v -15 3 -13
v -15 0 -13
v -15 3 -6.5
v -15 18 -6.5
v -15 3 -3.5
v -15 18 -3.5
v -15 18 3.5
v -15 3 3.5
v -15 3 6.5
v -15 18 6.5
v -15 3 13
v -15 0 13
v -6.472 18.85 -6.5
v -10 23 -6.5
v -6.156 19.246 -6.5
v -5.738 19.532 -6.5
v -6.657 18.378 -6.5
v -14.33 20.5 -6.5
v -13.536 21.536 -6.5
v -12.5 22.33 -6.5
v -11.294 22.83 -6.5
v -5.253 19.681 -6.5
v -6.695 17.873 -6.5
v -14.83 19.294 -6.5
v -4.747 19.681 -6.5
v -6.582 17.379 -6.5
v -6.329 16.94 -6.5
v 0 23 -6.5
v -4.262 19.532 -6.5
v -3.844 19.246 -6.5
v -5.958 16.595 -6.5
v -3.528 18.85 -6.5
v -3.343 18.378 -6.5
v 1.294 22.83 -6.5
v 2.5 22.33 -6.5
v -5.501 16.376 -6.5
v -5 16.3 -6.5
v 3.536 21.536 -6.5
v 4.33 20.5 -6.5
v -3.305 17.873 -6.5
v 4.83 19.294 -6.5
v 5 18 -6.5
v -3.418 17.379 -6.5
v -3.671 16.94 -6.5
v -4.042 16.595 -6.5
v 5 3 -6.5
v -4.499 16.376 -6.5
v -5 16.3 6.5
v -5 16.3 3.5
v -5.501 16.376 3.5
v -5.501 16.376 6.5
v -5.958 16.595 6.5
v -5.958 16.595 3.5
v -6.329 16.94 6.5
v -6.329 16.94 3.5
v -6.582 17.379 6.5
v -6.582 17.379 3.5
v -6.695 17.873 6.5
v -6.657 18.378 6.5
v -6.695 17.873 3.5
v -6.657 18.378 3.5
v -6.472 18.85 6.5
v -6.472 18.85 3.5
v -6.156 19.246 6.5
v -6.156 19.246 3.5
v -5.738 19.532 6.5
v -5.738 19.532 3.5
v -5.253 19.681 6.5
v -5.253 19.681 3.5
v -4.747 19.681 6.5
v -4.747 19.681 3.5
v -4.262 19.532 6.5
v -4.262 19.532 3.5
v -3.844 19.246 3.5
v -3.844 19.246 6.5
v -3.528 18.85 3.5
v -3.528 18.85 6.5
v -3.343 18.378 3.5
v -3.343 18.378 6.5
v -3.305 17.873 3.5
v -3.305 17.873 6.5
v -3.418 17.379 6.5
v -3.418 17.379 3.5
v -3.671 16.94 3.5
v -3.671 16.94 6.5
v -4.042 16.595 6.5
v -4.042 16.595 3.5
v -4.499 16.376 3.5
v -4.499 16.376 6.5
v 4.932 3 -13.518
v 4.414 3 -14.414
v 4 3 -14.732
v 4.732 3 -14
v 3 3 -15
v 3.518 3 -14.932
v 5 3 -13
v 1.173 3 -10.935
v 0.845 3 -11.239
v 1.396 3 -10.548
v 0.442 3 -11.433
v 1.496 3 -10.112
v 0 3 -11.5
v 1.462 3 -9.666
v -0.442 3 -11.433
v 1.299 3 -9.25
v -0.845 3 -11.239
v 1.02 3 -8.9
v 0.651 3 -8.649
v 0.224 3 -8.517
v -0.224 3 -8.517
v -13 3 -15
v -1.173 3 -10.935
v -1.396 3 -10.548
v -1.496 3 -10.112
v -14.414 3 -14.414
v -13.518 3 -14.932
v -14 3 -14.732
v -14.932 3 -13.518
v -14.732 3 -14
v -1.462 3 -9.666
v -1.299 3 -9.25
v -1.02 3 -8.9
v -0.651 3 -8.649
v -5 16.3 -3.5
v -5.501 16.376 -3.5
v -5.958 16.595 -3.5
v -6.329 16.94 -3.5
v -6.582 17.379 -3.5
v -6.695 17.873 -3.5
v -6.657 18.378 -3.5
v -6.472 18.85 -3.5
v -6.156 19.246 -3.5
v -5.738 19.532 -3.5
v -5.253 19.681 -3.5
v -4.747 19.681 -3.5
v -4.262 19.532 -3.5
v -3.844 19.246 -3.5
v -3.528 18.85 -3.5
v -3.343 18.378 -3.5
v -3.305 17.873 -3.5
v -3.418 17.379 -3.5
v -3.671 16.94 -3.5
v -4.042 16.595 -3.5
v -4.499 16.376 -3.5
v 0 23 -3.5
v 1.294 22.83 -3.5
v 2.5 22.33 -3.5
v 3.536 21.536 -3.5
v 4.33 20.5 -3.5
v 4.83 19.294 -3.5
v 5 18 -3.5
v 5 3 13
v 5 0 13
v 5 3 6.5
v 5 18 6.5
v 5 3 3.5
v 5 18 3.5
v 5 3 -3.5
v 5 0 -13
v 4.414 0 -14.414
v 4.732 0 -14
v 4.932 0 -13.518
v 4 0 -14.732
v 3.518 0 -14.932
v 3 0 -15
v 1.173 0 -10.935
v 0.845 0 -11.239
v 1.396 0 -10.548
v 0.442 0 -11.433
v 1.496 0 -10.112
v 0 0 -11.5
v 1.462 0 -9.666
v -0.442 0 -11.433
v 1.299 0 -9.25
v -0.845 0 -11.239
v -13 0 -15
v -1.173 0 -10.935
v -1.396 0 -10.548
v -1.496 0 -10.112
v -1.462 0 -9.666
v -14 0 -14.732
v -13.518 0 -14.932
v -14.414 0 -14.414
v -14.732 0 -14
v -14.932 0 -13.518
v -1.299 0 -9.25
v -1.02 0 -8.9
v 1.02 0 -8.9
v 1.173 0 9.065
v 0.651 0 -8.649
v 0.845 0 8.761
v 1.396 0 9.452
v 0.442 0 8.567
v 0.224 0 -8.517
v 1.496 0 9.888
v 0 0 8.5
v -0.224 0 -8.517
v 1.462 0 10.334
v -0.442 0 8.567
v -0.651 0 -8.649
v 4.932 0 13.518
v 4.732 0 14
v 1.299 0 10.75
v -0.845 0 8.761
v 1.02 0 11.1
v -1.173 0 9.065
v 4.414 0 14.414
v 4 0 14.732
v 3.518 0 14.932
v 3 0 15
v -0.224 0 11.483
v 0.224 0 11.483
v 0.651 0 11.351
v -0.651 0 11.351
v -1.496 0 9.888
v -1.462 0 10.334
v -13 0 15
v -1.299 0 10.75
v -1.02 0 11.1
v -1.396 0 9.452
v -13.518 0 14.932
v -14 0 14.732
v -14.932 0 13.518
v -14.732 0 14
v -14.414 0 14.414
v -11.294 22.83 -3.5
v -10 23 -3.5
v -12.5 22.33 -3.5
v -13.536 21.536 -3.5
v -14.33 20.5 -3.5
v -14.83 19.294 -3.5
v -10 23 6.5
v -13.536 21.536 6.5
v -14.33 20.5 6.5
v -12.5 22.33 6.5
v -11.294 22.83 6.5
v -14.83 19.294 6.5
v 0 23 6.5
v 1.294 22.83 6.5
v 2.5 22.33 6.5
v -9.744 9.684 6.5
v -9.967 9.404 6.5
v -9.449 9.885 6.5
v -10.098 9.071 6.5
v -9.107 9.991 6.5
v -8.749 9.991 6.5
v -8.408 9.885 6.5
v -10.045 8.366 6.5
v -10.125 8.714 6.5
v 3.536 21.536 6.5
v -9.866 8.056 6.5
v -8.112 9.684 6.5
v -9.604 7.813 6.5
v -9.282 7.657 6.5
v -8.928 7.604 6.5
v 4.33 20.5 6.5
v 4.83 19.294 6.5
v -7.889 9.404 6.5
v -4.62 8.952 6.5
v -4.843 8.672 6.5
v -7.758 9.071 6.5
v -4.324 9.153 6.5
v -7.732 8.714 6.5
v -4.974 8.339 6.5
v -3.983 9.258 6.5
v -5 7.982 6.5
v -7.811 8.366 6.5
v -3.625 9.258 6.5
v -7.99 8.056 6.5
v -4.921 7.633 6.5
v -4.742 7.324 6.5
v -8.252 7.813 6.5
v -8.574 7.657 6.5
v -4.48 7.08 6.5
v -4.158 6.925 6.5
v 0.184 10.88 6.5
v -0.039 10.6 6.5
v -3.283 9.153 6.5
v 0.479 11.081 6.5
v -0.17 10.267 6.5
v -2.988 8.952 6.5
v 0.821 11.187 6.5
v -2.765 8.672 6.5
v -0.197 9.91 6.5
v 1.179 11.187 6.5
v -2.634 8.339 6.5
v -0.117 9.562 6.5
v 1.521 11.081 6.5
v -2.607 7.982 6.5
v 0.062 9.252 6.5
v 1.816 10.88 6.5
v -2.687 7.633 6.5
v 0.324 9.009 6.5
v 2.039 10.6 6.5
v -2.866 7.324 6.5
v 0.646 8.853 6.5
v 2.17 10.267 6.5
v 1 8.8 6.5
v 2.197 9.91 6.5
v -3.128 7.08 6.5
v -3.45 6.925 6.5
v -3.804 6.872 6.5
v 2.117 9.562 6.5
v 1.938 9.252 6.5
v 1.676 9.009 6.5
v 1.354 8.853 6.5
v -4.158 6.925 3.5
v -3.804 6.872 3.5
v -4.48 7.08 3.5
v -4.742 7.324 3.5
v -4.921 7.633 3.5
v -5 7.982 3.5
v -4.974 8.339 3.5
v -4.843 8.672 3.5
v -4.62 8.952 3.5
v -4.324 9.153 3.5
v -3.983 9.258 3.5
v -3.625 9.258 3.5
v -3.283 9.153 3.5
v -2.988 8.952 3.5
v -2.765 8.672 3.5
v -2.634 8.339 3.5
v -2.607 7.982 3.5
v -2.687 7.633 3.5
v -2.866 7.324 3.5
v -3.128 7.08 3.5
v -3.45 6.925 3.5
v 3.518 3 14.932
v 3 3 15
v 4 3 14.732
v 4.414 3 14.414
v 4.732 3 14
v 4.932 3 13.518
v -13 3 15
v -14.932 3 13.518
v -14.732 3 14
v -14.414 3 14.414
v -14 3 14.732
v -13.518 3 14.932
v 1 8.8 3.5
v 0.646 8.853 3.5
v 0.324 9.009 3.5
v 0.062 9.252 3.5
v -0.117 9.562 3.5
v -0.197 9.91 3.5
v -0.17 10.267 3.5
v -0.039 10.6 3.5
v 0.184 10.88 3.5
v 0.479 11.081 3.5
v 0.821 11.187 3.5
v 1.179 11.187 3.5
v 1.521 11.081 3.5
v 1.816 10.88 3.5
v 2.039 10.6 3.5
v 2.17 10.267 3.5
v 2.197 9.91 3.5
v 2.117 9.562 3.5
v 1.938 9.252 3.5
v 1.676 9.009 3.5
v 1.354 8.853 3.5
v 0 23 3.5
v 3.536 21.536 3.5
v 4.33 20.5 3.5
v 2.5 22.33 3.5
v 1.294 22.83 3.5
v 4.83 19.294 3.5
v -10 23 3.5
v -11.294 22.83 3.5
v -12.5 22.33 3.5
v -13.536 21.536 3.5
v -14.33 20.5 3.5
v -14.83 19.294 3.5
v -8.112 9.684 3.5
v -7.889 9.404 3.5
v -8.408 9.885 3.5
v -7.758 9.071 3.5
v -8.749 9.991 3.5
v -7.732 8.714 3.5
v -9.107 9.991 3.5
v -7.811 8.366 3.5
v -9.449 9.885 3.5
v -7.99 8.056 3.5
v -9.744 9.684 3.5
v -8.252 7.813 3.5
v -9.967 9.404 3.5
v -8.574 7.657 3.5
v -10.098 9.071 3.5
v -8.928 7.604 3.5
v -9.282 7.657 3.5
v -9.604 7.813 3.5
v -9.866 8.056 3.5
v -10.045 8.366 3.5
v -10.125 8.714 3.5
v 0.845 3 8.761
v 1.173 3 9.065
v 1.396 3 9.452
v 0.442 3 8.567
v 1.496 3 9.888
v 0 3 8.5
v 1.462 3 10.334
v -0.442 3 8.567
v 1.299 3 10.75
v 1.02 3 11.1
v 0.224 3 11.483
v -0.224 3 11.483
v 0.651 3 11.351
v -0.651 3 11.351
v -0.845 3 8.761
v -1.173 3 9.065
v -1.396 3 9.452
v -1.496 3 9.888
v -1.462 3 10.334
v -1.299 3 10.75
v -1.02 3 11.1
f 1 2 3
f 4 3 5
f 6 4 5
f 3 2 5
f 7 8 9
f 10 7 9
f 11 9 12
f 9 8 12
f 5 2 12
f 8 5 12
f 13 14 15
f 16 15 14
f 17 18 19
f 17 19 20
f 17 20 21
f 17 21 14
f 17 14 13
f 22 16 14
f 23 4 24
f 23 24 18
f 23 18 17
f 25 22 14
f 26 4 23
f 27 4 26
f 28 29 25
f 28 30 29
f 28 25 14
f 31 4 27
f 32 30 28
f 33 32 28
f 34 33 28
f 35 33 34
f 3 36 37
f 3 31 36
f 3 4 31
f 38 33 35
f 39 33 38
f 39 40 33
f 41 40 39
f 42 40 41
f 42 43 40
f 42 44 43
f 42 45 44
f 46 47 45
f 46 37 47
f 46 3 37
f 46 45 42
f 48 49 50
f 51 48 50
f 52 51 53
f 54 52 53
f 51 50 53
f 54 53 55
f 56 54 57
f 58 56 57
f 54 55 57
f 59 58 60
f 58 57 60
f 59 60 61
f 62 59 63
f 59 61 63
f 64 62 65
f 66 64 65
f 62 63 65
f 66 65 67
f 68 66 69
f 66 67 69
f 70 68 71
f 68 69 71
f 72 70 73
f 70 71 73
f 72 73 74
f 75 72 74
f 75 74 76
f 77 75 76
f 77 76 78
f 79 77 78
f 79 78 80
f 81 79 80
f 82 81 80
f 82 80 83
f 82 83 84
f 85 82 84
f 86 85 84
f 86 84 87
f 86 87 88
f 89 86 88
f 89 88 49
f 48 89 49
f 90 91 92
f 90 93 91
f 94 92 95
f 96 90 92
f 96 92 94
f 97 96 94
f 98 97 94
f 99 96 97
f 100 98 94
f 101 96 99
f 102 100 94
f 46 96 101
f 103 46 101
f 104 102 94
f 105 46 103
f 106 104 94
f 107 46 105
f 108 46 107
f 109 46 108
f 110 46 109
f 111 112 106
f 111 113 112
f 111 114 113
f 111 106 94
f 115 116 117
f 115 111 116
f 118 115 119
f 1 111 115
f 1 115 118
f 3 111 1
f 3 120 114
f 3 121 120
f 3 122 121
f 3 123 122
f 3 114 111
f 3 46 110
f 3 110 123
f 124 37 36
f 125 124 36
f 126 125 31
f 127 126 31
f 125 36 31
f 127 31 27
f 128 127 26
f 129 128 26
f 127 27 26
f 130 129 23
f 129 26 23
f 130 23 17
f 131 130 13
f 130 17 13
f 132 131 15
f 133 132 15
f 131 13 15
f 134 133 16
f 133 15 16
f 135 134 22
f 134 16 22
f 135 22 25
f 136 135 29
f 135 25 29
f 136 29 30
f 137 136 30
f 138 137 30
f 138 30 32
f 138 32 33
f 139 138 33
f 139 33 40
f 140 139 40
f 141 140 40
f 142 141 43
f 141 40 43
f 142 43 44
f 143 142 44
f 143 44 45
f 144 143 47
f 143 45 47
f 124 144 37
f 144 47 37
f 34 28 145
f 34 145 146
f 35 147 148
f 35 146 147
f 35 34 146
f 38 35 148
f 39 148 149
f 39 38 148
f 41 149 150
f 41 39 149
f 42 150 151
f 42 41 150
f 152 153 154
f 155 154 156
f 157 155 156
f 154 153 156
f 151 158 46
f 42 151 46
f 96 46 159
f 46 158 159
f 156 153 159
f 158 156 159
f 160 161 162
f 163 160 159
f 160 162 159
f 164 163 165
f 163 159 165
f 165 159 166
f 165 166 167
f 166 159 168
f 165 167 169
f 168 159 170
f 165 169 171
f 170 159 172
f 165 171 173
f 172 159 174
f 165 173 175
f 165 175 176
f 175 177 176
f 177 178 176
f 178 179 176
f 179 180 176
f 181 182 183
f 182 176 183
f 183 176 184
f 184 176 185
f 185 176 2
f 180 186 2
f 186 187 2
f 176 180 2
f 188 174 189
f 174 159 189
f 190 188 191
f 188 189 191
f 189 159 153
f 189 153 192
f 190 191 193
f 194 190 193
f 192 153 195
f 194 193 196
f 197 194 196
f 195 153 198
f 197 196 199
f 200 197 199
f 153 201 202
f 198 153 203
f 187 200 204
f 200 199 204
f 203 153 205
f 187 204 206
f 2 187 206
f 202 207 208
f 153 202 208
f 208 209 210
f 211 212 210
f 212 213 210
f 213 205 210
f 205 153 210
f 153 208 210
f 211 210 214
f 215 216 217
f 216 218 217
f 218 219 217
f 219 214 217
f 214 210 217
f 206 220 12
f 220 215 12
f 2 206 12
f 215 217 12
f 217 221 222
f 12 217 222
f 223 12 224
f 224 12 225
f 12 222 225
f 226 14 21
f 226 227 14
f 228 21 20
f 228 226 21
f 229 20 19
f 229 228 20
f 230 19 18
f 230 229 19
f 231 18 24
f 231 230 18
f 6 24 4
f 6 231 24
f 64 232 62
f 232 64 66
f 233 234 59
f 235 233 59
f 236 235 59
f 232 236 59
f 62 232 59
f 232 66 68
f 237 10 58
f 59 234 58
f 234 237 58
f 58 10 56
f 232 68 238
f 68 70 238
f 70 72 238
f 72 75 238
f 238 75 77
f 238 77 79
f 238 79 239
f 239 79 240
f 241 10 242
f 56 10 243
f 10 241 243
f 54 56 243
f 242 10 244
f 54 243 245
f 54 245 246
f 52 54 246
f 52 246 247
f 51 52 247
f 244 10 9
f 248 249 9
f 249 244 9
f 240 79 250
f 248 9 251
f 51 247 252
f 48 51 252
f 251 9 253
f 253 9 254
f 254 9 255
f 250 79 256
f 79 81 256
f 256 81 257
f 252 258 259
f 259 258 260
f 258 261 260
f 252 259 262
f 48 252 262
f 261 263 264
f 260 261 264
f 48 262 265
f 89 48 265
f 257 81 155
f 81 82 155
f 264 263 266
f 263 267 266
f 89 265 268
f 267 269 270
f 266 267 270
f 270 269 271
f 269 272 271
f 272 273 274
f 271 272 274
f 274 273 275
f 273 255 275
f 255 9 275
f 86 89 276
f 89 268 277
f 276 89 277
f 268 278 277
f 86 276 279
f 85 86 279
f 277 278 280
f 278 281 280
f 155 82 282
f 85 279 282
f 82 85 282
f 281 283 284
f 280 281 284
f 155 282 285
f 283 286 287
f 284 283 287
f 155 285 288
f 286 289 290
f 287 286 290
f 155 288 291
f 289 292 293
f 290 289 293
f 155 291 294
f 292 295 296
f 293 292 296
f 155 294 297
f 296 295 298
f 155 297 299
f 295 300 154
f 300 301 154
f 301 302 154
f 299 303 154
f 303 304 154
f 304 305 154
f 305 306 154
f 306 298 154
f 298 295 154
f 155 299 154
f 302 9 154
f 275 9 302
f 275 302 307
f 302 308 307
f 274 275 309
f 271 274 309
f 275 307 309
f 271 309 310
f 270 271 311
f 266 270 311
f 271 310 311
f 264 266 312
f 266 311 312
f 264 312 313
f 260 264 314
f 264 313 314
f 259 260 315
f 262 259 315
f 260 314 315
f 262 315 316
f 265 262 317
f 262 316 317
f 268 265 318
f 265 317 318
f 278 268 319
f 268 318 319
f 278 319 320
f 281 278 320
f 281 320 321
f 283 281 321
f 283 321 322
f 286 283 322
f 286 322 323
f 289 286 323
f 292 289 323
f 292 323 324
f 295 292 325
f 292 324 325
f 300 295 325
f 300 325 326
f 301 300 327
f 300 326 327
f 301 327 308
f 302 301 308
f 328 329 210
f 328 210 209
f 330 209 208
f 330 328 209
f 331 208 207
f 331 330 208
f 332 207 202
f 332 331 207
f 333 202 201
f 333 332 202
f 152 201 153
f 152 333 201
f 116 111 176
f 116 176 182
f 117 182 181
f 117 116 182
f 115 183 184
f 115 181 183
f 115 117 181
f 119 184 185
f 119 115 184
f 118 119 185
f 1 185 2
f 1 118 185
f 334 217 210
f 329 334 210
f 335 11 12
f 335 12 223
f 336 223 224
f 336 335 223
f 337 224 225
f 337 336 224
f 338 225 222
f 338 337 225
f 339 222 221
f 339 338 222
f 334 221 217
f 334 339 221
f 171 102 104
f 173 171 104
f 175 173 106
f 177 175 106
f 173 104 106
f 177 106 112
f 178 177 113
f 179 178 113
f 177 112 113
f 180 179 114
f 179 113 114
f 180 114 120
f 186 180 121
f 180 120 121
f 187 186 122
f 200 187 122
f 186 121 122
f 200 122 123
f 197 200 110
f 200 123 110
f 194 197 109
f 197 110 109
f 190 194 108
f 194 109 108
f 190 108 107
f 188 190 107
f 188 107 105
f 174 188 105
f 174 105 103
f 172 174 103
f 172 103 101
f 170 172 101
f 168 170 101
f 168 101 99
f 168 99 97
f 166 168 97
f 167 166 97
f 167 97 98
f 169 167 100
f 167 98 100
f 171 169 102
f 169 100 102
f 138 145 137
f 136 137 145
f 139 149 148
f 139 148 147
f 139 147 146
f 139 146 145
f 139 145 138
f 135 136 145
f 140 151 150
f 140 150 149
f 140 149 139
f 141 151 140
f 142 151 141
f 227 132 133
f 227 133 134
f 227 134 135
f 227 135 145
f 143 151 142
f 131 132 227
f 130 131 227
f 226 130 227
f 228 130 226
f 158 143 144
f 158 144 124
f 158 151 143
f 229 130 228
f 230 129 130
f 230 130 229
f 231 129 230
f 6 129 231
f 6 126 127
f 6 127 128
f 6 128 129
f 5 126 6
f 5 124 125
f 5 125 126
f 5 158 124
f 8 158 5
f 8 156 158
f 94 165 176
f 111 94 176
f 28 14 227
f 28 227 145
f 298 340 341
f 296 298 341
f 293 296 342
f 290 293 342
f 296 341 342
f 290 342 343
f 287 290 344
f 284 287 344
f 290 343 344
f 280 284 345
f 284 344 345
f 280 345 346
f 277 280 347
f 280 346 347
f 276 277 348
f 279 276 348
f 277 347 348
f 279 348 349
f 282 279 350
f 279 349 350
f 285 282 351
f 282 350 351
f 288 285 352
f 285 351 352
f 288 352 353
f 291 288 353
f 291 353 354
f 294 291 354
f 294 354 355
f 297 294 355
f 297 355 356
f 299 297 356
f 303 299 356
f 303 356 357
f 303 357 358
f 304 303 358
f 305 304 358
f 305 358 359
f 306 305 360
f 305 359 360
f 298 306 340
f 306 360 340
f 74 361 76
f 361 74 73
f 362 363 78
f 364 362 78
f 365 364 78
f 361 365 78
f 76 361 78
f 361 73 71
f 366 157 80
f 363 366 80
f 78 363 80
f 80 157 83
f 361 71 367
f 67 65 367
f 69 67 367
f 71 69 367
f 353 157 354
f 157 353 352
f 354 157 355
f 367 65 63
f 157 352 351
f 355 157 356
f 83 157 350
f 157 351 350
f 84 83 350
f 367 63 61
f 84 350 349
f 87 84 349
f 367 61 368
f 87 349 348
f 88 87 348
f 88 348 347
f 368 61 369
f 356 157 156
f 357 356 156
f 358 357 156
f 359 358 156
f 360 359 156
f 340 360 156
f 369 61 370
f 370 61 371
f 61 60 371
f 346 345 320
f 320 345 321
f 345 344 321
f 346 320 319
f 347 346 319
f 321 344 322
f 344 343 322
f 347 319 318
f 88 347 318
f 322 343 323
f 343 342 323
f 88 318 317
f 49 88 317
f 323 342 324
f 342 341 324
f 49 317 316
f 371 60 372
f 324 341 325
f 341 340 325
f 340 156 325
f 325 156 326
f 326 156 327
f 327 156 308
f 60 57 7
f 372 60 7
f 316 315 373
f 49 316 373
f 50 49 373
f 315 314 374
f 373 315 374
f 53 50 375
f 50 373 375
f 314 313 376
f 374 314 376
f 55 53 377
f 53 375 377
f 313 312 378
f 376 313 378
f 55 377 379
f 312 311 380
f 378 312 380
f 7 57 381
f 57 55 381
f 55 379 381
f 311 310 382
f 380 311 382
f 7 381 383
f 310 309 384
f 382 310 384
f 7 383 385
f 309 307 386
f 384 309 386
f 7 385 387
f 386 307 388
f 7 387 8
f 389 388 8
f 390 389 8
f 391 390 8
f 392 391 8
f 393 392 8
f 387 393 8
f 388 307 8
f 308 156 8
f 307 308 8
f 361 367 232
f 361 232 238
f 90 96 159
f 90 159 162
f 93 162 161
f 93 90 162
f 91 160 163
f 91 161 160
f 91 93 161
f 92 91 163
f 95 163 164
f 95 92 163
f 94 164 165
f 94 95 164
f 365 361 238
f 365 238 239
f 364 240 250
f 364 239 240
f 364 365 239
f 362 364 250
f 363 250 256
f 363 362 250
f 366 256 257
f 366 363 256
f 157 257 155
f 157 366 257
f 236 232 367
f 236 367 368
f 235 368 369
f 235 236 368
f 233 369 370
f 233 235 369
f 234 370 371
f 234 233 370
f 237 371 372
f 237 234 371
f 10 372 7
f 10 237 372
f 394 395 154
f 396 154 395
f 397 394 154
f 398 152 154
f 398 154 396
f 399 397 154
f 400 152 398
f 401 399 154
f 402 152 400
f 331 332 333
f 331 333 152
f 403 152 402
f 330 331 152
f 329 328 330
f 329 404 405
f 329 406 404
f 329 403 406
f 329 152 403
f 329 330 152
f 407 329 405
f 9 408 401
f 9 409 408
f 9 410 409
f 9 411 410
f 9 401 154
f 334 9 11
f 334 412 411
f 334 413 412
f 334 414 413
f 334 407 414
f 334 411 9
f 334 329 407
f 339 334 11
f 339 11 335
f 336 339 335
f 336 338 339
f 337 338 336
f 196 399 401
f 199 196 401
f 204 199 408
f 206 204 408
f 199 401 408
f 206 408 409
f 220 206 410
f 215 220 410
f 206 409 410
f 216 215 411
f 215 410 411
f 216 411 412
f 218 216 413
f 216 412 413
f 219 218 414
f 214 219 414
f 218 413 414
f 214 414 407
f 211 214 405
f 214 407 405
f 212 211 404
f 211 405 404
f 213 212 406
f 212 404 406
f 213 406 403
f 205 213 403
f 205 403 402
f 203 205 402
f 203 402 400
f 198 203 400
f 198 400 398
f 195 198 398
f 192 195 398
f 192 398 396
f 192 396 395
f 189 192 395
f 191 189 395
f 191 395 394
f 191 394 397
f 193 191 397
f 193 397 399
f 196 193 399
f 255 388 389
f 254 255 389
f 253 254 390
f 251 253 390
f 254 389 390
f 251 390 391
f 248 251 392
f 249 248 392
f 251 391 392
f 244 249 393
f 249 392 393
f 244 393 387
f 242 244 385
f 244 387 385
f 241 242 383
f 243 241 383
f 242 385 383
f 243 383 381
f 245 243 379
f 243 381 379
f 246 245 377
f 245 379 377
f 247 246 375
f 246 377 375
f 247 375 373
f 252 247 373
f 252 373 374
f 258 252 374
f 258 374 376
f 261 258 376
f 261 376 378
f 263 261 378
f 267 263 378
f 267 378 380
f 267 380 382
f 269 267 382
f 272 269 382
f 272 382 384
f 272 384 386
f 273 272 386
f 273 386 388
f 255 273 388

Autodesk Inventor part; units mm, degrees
ref_plane "YZ Plane" through (0, 0, 0) normal (1, 0, 0) x (0, 1, 0)
ref_plane "XZ Plane" through (0, 0, 0) normal (0, 1, 0) x (-1, 0, 0)
ref_plane "XY Plane" through (0, 0, 0) normal (0, 0, 1) x (1, 0, 0)
sketch "Szkic1" plane through (0, 0, 0) normal (0, 1, 0) x (-1, 0, 0)
  line L0 (15, 15) -> (-5, 15)
  line L1 (-5, 15) -> (-5, -15)
  line L2 (-5, -15) -> (15, -15)
  line L3 (15, -15) -> (15, 15)
  point P0 (0, 0)
  point P1 (0, 10)
  point P2 (0, -10)
  dimension "d0" = 20
  dimension "d1" = 20
  dimension "d2" = 15
  dimension "d3" = 5
  dimension "d4" = 5
extrude "Wyciągnięcie proste1" add sketch "Szkic1" along normal blind 3
hole "Otwór1" at (0, 0, 10) at (0, 0, -10) direction (0, 1, 0) diameter 3 end through all
sketch "Szkic2" plane through (0, 3, 0) normal (0, 1, 0) x (1, 0, 0)
  circle A0 centre (0, -10) radius 1.5 projected
  circle A1 centre (0, 10) radius 1.5 projected
  line L0 (-15, -15) -> (5, -15) projected
  line L1 (5, -15) -> (5, 15) projected
  line L2 (5, 15) -> (-15, 15) projected
  line L3 (-15, 15) -> (-15, -15) projected
  line L4 (5, -15) -> (5, 15) projected
  line L5 (-15, -6.5) -> (5, -6.5)
  line L6 (5, -6.5) -> (5, -3.5)
  line L7 (5, -3.5) -> (-15, -3.5)
  line L8 (-15, -3.5) -> (-15, -6.5)
  line L9 (-15, 15) -> (-15, -15) projected
  line L10 (-15, 6.5) -> (5, 6.5)
  line L11 (5, 6.5) -> (5, 3.5)
  line L12 (5, 3.5) -> (-15, 3.5)
  line L13 (-15, 3.5) -> (-15, 6.5)
  point P0 (0, 0)
  dimension "d14" = 3
  dimension "d15" = 3
  dimension "d16" = 2
  dimension "d17" = 2
fillet "Zaokrąglenie1" radius 2 4 edges at (5, 1.5, 15) (-15, 1.5, 15) (5, 1.5, -15) (-15, 1.5, -15)
extrude "Wyciągnięcie proste2" add sketch "Szkic2" along normal blind 20 contours L3 L7 L1 L5 | L3 L10 L1 L12
fillet "Zaokrąglenie2" radius 5 4 edges at (-15, 23, 5) (5, 23, 5) (5, 23, -5) (-15, 23, -5)
sketch "Szkic3" plane through (-15, 3, 6.5) normal (0, 0, 1) x (1, 0, 0)
  arc A0 (5, 20) -> (0, 15) centre (5, 15) ccw projected
  line L0 (0, 0) -> (0, 15) projected
  line L1 (20, 0) -> (0, 0) projected
  line L2 (20, 0) -> (20, 15) projected
  arc A1 (20, 15) -> (15, 20) centre (15, 15) ccw projected
  line L3 (5, 20) -> (15, 20) projected
  point P0 (15, -3)
  point P1 (10, 15)
  dimension "d52" = 10
hole "Otwór2" at (-5, 18, 6.5) direction (0, 0, -1) diameter 3.4 end through all clearance for "Śruba ze łbem płaskim obrobiona" size "M3" standard "ANSI Profil metryczny M"
sketch "Szkic4" plane through (-15, 3, 6.5) normal (0, 0, 1) x (1, 0, 0)
  arc A0 (5, 20) -> (0, 15) centre (5, 15) ccw projected
  line L0 (0, 0) -> (0, 15) projected
  line L1 (20, 0) -> (0, 0) projected
  line L2 (20, 0) -> (20, 15) projected
  circle A1 centre (10, 15.0001) radius 10 construction
  arc A2 (20, 15) -> (15, 20) centre (15, 15) ccw projected
  line L3 (5, 20) -> (15, 20) projected
  point P0 (15, -3)
  point P1 (6.0718, 5.804)
  point P2 (16, 7.0001)
  point P3 (11.1962, 5.0719)
  dimension "d33" = 20
  dimension "d53" = 30
  dimension "d54" = 30
  dimension "d62" = 4
hole "Otwór5" at (-8.9282, 8.804, 6.5) at (1, 10.0001, 6.5) at (-3.8038, 8.0719, 6.5) direction (0, 0, -1) diameter 2.4 end up to surface clearance for "Śruba ze łbem płaskim obrobiona" size "M2" standard "ANSI Profil metryczny M"
sketch "Szkic5" plane through (-15, 3, 6.5) normal (0, 0, 1) x (1, 0, 0)
  circle A0 centre (0, 0) radius 55 construction
  circle A1 centre (137.9996, 0.347) radius 55 construction
  circle A2 centre (275.9991, 0.6941) radius 55 construction
  line L0 (-173.3991, 195.8773) -> (-173.4121, 201.0636) construction
  line L1 (-173.3991, 247) -> (-173.3991, -116) construction
  line L2 (275.9991, -54.3059) -> (-673, -54.3059) construction
  line L3 (-488.3991, -4.3059) -> (-438.3991, -4.3059) construction
  line L4 (-438.3991, -4.3059) -> (-438.3991, -54.3059) construction
  line L5 (-438.3991, -54.3059) -> (-488.3991, -54.3059) construction
  line L6 (-488.3991, -54.3059) -> (-488.3991, -4.3059) construction
  line L7 (-438.4326, 222.6941) -> (233, 222.6941) construction
  line L8 (-438.4326, 192.6941) -> (378, 192.6941) construction
  line L9 (-476, 207.6941) -> (256, 207.6941) construction
  point P0 (15, -3)
  dimension "d63" = 50
  dimension "d64" = 50
  dimension "d65" = 265
  dimension "d66" = 277
  dimension "d67" = 30
  dimension "d68" = 15
equation "\"d4\" = d3"
equation "\"d15\" = d14"
equation "\"d54\" = d53"
equation "\"d68\" = 0.5 * d67"
